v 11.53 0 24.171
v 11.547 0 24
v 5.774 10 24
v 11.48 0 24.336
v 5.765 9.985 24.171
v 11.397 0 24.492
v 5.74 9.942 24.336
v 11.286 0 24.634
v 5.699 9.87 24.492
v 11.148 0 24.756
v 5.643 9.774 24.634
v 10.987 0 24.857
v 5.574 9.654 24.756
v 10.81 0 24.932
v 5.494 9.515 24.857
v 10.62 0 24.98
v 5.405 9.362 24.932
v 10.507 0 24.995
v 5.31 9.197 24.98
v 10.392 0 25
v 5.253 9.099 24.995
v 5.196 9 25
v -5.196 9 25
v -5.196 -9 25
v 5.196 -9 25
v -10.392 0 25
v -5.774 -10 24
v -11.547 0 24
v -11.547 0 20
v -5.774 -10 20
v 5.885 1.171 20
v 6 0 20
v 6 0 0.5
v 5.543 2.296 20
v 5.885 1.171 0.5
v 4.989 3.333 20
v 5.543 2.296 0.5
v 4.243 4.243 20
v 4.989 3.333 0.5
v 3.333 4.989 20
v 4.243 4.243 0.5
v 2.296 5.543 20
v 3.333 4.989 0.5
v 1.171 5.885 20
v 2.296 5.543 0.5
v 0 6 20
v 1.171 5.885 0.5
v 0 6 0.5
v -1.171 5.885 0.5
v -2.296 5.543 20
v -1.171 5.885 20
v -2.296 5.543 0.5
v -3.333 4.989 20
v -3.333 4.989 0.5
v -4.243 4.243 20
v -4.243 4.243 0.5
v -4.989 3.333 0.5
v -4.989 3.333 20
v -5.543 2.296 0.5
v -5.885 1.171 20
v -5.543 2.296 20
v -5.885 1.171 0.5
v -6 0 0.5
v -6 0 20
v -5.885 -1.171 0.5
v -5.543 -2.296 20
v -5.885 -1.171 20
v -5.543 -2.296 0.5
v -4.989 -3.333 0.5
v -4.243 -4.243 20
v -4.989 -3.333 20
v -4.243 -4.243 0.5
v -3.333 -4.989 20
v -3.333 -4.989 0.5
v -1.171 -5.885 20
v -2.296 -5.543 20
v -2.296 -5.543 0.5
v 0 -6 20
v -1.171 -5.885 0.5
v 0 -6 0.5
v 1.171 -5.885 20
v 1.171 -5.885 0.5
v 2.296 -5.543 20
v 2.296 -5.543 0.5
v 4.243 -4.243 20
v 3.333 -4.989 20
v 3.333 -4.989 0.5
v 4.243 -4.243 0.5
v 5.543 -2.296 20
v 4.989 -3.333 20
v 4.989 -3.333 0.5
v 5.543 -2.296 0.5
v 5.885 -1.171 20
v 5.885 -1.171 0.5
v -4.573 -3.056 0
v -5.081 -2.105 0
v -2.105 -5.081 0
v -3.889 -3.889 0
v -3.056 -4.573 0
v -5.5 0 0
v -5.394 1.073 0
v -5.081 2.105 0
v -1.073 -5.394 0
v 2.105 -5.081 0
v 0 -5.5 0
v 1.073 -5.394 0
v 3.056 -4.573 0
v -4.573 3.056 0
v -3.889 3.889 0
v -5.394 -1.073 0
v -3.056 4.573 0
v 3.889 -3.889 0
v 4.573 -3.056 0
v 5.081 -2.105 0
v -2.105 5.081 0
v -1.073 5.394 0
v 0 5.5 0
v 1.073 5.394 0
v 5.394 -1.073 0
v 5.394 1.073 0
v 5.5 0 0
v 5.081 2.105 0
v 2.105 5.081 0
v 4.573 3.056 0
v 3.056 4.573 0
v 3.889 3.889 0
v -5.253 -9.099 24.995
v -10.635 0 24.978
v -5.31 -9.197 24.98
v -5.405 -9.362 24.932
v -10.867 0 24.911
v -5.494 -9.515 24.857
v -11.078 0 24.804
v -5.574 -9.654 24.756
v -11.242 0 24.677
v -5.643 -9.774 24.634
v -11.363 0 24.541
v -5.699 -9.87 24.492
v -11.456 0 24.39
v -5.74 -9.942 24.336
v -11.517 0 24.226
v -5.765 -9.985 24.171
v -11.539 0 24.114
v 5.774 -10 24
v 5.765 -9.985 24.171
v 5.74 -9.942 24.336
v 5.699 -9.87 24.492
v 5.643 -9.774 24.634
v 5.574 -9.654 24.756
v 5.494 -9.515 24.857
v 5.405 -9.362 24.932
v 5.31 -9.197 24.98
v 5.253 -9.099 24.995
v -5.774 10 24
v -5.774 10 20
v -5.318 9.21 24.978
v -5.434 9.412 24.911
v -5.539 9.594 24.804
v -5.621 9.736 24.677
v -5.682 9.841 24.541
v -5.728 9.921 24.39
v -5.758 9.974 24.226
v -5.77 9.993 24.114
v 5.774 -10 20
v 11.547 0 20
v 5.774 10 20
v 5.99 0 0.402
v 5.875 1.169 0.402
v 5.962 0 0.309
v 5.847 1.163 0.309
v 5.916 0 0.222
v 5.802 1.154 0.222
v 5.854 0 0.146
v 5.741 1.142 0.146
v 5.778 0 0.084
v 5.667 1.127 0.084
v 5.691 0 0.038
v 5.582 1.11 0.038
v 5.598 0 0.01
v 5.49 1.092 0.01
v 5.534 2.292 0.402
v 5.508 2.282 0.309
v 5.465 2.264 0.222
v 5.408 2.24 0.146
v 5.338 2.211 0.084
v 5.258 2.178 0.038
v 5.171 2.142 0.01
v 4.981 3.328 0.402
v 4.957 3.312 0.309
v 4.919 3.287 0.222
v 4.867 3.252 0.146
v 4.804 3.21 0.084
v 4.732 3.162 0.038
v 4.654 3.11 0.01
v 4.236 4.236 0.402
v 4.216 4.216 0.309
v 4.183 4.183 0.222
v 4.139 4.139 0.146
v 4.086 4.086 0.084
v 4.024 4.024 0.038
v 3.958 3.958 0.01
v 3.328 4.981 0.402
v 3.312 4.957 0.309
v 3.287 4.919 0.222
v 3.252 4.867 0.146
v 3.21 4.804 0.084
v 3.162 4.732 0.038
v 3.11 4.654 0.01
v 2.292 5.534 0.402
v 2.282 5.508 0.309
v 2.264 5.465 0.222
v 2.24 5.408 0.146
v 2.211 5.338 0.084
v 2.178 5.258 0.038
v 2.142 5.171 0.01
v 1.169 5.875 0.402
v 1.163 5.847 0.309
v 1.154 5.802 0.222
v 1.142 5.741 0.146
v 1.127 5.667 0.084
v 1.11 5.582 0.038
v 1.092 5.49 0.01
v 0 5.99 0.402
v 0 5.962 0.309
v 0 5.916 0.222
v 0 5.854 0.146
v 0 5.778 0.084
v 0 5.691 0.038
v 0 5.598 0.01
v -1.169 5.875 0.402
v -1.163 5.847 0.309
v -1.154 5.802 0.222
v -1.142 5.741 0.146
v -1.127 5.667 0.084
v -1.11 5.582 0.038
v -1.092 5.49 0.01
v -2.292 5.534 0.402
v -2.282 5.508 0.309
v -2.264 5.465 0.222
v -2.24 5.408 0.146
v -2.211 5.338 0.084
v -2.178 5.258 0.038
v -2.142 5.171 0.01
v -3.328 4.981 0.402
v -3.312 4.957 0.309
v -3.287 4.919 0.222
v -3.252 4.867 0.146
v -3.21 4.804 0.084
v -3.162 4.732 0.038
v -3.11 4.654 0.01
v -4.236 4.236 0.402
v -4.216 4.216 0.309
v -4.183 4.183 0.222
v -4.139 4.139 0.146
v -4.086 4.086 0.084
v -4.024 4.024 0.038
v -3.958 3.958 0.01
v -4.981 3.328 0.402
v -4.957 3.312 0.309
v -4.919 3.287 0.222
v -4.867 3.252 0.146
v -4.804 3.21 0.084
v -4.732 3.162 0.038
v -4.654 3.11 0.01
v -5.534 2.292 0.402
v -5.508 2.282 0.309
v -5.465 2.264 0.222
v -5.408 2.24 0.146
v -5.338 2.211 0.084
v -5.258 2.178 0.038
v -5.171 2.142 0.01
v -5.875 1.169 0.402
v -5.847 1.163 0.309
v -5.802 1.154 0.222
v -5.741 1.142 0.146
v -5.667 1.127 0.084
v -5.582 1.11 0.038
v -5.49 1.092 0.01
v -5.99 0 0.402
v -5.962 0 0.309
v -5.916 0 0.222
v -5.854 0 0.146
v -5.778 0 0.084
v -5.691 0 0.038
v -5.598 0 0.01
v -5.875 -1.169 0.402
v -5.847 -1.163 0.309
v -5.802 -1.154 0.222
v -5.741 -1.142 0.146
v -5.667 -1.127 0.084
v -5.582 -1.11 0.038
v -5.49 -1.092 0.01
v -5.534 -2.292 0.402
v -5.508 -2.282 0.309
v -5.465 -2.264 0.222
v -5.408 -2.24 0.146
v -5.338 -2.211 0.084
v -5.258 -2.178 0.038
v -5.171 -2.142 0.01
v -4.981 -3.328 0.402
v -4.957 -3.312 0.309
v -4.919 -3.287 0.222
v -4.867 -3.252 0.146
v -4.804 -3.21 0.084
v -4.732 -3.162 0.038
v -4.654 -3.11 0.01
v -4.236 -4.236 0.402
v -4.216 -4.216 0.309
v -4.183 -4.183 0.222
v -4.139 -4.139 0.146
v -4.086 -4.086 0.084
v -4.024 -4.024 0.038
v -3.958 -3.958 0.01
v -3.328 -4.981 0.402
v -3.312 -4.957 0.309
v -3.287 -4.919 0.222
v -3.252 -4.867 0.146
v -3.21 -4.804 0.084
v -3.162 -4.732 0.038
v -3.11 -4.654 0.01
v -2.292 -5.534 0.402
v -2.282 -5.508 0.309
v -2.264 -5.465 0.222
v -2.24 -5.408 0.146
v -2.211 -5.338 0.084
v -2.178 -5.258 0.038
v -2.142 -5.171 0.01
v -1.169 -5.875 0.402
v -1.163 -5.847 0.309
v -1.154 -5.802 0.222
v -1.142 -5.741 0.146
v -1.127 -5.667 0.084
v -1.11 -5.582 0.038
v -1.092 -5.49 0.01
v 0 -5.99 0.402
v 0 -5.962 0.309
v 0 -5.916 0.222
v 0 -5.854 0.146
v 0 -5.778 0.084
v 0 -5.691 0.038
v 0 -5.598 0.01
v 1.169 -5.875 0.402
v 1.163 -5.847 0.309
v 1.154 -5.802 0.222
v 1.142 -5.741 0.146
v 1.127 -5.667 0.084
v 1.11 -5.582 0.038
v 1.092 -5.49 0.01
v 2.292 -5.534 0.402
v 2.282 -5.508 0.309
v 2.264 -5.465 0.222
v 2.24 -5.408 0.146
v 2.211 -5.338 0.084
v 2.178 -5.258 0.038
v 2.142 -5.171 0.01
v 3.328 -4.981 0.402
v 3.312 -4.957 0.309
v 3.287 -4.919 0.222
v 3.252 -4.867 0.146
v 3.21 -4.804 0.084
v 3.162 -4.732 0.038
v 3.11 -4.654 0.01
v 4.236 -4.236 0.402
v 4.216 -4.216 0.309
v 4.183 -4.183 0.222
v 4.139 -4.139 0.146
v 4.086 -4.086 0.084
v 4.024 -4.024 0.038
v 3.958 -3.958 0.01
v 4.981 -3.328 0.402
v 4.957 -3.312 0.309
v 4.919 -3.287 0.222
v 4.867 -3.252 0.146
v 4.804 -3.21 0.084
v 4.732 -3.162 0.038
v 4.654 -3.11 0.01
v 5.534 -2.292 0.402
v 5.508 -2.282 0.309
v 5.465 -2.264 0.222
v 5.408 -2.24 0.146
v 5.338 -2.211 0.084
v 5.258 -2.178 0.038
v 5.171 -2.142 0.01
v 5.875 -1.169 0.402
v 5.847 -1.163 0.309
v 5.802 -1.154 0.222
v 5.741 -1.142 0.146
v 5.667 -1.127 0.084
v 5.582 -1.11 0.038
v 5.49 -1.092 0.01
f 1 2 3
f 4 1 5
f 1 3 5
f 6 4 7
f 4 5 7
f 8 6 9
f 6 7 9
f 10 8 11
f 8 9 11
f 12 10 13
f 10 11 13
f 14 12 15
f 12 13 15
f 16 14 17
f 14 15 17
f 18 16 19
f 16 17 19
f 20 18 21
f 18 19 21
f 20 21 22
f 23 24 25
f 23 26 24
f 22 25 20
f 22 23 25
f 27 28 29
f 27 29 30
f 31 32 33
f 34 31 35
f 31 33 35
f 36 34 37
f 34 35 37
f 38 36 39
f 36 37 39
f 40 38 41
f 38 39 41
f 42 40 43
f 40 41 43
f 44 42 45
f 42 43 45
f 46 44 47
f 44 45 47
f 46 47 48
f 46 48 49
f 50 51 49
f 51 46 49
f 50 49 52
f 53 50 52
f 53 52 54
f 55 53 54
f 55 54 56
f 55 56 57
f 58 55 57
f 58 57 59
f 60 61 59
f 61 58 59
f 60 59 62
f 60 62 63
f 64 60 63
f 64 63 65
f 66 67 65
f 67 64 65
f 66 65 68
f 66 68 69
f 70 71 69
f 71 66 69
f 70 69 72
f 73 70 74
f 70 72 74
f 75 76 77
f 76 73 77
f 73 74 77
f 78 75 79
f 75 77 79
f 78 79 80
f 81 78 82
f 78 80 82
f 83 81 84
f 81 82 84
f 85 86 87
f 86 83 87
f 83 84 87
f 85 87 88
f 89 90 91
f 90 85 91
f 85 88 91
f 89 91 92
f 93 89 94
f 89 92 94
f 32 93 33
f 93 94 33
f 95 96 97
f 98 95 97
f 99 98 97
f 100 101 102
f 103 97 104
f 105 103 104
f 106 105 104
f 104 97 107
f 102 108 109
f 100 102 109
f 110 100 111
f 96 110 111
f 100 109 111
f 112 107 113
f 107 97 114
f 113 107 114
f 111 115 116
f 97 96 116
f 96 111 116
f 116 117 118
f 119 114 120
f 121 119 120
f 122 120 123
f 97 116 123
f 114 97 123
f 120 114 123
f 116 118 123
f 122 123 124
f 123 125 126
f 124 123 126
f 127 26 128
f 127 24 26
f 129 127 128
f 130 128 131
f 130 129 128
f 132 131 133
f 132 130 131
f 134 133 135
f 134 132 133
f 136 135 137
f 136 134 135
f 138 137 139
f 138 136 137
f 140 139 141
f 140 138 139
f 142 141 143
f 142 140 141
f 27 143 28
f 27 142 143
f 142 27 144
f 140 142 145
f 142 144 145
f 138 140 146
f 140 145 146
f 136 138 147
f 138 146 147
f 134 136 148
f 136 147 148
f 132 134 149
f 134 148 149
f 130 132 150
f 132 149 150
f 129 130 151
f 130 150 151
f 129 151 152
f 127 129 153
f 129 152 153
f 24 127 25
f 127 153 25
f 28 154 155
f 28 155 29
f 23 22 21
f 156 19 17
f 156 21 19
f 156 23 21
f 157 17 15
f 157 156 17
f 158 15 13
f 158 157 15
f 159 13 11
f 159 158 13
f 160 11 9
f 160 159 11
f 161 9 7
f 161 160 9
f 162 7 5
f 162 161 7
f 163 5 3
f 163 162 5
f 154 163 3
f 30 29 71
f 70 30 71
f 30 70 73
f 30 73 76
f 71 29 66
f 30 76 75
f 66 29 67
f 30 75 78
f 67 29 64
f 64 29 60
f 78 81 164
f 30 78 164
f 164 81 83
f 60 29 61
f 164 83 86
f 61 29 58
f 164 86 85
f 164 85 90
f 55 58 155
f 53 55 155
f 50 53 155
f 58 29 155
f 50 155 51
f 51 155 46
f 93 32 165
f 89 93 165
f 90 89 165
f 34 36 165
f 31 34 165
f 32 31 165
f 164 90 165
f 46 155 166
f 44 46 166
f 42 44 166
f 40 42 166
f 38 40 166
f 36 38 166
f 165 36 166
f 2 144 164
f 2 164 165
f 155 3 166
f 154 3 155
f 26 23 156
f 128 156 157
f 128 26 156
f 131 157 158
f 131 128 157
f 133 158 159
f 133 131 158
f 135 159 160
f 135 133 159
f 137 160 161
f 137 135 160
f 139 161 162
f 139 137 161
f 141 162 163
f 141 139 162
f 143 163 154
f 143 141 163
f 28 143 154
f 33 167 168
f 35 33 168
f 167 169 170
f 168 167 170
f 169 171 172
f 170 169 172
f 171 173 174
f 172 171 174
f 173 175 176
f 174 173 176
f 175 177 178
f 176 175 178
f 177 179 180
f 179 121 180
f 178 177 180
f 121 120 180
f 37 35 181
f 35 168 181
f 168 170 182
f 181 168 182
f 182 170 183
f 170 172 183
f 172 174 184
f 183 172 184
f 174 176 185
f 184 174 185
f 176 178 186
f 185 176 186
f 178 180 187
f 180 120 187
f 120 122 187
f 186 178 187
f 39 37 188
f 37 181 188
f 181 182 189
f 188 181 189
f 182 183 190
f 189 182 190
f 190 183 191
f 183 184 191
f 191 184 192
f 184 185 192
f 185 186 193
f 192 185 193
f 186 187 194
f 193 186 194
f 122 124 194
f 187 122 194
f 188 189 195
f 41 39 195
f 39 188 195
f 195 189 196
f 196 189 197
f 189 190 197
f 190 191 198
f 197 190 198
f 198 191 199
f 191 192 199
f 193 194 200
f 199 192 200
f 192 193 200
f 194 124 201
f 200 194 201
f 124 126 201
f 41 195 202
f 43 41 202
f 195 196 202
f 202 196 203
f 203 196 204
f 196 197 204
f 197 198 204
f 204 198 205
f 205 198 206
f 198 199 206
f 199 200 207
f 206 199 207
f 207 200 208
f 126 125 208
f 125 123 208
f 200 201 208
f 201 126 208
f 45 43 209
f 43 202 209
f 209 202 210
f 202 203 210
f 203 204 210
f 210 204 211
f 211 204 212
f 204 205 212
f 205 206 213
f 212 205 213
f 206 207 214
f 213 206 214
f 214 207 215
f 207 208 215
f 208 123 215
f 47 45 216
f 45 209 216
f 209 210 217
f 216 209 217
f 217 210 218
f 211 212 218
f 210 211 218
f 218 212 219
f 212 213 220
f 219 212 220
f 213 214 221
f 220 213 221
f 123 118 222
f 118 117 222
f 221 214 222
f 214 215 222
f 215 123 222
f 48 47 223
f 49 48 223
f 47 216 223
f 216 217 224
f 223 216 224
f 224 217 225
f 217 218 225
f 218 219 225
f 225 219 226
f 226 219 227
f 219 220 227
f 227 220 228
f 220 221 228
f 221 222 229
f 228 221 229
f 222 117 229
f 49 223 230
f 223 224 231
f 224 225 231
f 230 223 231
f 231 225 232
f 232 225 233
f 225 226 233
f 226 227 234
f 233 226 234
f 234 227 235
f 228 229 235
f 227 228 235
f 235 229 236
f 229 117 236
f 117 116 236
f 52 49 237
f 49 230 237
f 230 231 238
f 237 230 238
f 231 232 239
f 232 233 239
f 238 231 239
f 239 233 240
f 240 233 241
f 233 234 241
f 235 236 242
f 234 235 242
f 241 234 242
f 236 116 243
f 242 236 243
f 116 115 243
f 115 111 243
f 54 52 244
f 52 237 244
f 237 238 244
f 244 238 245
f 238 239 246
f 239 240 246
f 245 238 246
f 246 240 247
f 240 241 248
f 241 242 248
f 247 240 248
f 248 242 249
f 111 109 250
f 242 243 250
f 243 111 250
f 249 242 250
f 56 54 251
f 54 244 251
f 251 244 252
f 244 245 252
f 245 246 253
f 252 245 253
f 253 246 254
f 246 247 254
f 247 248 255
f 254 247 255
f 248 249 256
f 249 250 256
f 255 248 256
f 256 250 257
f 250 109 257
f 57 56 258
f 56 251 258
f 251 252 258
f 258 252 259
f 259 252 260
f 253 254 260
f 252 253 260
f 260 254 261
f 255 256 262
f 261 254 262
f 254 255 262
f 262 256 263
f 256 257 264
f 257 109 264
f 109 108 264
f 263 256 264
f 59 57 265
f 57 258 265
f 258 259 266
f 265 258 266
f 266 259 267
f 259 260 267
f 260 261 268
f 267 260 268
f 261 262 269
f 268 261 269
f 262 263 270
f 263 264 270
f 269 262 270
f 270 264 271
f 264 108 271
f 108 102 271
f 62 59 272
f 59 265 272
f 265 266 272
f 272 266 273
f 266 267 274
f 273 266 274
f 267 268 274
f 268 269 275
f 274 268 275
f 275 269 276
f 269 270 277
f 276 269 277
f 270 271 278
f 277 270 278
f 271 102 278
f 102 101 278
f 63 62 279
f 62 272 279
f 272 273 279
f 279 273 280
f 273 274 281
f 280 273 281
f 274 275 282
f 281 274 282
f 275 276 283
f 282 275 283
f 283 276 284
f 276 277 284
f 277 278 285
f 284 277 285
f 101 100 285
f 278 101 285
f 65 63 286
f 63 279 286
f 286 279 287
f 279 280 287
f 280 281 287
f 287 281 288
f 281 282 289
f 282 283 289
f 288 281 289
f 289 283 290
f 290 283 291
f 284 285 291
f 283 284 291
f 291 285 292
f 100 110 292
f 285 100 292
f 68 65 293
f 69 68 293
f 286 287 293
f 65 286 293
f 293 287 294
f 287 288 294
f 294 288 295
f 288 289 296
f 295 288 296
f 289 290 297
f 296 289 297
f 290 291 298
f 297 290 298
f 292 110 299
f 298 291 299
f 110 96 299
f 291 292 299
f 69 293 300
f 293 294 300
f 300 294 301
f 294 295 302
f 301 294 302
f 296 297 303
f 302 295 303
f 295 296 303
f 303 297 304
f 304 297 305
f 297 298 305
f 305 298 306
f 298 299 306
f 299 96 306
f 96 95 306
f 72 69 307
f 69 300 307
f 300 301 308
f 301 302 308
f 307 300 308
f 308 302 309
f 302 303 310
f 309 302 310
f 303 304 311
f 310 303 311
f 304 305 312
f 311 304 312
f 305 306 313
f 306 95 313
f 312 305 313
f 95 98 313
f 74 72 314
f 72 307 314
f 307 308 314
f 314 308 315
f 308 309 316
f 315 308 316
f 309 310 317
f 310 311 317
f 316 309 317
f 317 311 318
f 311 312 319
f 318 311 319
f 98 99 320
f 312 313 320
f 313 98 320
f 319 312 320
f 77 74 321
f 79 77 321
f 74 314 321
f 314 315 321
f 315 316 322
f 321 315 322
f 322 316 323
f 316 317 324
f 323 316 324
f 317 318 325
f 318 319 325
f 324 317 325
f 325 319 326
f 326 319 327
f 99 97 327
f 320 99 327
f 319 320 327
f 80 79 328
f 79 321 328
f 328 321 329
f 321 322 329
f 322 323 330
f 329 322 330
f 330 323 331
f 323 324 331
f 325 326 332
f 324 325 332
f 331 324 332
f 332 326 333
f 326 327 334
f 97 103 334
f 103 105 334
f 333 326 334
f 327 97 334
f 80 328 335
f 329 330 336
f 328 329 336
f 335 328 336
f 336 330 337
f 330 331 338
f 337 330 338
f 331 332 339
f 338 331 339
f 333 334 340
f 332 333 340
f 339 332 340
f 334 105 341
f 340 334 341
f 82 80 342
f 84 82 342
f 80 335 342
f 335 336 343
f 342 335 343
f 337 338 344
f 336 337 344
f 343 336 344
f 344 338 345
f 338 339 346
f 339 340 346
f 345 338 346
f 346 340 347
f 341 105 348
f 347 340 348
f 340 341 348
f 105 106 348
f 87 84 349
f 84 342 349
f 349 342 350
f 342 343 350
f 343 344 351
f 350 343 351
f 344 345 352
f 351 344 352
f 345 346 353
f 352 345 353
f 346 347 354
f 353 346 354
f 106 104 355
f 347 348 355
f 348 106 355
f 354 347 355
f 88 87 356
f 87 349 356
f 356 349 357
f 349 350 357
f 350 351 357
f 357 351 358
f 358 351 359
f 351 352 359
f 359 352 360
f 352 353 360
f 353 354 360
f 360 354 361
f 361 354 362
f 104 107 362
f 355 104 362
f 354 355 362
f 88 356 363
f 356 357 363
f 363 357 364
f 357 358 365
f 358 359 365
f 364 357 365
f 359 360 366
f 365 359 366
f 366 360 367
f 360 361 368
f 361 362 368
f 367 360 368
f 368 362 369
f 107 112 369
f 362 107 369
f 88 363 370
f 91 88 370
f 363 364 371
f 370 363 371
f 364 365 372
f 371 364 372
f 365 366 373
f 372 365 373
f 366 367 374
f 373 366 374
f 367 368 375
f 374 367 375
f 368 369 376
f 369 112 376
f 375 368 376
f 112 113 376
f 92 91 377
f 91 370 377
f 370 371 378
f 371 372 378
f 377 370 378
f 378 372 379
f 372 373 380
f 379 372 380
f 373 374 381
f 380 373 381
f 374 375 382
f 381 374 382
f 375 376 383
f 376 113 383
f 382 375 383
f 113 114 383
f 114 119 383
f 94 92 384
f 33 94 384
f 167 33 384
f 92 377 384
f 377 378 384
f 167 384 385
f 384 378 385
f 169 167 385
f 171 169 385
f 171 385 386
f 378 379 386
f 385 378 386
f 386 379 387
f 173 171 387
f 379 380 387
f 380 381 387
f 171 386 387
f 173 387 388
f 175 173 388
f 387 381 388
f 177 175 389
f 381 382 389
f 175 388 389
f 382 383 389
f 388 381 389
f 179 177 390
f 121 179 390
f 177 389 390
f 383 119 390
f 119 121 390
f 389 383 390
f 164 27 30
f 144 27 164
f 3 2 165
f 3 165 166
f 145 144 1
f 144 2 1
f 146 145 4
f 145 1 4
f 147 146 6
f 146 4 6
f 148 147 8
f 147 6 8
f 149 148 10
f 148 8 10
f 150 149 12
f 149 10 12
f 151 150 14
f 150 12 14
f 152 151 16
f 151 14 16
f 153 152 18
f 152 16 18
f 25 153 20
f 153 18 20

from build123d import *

# Parameters (mm, degrees)
SKETCH_1_R      = 6
EXTRUDE_1_DEPTH = 25
EXTRUDE_2_DEPTH = 5
FILLET_1_R      = 1
FILLET_2_R      = 0.5


with BuildPart() as part:
    # 草图1 → 凸台-拉伸1 (new body)
    with BuildSketch(Plane.XY):
        Circle(SKETCH_1_R)
    extrude(amount=EXTRUDE_1_DEPTH)

    # 草图3 → 凸台-拉伸2 (add)
    with BuildSketch(Plane.XY.offset(25)):
        Polygon((5.773502692, -10), (11.547005384, 0), (5.773502692, 10), (-5.773502692, 10), (-11.547005384, 0), (-5.773502692, -10), align=None)
    extrude(amount=-EXTRUDE_2_DEPTH)

    # 圆角1
    fillet_1_edges = [part.edges().sort_by_distance(p)[0] for p in [
        (0, -10, 25),
        (8.660254038, -5, 25),
        (8.660254038, 5, 25),
        (0, 10, 25),
        (-8.660254038, 5, 25),
        (-8.660254038, -5, 25),
    ]]
    fillet(fillet_1_edges, radius=FILLET_1_R)

    # 圆角2
    fillet_2_edges = [part.edges().sort_by_distance(p)[0] for p in [
        (-6, 0, 0),
    ]]
    fillet(fillet_2_edges, radius=FILLET_2_R)


solid = part.part
